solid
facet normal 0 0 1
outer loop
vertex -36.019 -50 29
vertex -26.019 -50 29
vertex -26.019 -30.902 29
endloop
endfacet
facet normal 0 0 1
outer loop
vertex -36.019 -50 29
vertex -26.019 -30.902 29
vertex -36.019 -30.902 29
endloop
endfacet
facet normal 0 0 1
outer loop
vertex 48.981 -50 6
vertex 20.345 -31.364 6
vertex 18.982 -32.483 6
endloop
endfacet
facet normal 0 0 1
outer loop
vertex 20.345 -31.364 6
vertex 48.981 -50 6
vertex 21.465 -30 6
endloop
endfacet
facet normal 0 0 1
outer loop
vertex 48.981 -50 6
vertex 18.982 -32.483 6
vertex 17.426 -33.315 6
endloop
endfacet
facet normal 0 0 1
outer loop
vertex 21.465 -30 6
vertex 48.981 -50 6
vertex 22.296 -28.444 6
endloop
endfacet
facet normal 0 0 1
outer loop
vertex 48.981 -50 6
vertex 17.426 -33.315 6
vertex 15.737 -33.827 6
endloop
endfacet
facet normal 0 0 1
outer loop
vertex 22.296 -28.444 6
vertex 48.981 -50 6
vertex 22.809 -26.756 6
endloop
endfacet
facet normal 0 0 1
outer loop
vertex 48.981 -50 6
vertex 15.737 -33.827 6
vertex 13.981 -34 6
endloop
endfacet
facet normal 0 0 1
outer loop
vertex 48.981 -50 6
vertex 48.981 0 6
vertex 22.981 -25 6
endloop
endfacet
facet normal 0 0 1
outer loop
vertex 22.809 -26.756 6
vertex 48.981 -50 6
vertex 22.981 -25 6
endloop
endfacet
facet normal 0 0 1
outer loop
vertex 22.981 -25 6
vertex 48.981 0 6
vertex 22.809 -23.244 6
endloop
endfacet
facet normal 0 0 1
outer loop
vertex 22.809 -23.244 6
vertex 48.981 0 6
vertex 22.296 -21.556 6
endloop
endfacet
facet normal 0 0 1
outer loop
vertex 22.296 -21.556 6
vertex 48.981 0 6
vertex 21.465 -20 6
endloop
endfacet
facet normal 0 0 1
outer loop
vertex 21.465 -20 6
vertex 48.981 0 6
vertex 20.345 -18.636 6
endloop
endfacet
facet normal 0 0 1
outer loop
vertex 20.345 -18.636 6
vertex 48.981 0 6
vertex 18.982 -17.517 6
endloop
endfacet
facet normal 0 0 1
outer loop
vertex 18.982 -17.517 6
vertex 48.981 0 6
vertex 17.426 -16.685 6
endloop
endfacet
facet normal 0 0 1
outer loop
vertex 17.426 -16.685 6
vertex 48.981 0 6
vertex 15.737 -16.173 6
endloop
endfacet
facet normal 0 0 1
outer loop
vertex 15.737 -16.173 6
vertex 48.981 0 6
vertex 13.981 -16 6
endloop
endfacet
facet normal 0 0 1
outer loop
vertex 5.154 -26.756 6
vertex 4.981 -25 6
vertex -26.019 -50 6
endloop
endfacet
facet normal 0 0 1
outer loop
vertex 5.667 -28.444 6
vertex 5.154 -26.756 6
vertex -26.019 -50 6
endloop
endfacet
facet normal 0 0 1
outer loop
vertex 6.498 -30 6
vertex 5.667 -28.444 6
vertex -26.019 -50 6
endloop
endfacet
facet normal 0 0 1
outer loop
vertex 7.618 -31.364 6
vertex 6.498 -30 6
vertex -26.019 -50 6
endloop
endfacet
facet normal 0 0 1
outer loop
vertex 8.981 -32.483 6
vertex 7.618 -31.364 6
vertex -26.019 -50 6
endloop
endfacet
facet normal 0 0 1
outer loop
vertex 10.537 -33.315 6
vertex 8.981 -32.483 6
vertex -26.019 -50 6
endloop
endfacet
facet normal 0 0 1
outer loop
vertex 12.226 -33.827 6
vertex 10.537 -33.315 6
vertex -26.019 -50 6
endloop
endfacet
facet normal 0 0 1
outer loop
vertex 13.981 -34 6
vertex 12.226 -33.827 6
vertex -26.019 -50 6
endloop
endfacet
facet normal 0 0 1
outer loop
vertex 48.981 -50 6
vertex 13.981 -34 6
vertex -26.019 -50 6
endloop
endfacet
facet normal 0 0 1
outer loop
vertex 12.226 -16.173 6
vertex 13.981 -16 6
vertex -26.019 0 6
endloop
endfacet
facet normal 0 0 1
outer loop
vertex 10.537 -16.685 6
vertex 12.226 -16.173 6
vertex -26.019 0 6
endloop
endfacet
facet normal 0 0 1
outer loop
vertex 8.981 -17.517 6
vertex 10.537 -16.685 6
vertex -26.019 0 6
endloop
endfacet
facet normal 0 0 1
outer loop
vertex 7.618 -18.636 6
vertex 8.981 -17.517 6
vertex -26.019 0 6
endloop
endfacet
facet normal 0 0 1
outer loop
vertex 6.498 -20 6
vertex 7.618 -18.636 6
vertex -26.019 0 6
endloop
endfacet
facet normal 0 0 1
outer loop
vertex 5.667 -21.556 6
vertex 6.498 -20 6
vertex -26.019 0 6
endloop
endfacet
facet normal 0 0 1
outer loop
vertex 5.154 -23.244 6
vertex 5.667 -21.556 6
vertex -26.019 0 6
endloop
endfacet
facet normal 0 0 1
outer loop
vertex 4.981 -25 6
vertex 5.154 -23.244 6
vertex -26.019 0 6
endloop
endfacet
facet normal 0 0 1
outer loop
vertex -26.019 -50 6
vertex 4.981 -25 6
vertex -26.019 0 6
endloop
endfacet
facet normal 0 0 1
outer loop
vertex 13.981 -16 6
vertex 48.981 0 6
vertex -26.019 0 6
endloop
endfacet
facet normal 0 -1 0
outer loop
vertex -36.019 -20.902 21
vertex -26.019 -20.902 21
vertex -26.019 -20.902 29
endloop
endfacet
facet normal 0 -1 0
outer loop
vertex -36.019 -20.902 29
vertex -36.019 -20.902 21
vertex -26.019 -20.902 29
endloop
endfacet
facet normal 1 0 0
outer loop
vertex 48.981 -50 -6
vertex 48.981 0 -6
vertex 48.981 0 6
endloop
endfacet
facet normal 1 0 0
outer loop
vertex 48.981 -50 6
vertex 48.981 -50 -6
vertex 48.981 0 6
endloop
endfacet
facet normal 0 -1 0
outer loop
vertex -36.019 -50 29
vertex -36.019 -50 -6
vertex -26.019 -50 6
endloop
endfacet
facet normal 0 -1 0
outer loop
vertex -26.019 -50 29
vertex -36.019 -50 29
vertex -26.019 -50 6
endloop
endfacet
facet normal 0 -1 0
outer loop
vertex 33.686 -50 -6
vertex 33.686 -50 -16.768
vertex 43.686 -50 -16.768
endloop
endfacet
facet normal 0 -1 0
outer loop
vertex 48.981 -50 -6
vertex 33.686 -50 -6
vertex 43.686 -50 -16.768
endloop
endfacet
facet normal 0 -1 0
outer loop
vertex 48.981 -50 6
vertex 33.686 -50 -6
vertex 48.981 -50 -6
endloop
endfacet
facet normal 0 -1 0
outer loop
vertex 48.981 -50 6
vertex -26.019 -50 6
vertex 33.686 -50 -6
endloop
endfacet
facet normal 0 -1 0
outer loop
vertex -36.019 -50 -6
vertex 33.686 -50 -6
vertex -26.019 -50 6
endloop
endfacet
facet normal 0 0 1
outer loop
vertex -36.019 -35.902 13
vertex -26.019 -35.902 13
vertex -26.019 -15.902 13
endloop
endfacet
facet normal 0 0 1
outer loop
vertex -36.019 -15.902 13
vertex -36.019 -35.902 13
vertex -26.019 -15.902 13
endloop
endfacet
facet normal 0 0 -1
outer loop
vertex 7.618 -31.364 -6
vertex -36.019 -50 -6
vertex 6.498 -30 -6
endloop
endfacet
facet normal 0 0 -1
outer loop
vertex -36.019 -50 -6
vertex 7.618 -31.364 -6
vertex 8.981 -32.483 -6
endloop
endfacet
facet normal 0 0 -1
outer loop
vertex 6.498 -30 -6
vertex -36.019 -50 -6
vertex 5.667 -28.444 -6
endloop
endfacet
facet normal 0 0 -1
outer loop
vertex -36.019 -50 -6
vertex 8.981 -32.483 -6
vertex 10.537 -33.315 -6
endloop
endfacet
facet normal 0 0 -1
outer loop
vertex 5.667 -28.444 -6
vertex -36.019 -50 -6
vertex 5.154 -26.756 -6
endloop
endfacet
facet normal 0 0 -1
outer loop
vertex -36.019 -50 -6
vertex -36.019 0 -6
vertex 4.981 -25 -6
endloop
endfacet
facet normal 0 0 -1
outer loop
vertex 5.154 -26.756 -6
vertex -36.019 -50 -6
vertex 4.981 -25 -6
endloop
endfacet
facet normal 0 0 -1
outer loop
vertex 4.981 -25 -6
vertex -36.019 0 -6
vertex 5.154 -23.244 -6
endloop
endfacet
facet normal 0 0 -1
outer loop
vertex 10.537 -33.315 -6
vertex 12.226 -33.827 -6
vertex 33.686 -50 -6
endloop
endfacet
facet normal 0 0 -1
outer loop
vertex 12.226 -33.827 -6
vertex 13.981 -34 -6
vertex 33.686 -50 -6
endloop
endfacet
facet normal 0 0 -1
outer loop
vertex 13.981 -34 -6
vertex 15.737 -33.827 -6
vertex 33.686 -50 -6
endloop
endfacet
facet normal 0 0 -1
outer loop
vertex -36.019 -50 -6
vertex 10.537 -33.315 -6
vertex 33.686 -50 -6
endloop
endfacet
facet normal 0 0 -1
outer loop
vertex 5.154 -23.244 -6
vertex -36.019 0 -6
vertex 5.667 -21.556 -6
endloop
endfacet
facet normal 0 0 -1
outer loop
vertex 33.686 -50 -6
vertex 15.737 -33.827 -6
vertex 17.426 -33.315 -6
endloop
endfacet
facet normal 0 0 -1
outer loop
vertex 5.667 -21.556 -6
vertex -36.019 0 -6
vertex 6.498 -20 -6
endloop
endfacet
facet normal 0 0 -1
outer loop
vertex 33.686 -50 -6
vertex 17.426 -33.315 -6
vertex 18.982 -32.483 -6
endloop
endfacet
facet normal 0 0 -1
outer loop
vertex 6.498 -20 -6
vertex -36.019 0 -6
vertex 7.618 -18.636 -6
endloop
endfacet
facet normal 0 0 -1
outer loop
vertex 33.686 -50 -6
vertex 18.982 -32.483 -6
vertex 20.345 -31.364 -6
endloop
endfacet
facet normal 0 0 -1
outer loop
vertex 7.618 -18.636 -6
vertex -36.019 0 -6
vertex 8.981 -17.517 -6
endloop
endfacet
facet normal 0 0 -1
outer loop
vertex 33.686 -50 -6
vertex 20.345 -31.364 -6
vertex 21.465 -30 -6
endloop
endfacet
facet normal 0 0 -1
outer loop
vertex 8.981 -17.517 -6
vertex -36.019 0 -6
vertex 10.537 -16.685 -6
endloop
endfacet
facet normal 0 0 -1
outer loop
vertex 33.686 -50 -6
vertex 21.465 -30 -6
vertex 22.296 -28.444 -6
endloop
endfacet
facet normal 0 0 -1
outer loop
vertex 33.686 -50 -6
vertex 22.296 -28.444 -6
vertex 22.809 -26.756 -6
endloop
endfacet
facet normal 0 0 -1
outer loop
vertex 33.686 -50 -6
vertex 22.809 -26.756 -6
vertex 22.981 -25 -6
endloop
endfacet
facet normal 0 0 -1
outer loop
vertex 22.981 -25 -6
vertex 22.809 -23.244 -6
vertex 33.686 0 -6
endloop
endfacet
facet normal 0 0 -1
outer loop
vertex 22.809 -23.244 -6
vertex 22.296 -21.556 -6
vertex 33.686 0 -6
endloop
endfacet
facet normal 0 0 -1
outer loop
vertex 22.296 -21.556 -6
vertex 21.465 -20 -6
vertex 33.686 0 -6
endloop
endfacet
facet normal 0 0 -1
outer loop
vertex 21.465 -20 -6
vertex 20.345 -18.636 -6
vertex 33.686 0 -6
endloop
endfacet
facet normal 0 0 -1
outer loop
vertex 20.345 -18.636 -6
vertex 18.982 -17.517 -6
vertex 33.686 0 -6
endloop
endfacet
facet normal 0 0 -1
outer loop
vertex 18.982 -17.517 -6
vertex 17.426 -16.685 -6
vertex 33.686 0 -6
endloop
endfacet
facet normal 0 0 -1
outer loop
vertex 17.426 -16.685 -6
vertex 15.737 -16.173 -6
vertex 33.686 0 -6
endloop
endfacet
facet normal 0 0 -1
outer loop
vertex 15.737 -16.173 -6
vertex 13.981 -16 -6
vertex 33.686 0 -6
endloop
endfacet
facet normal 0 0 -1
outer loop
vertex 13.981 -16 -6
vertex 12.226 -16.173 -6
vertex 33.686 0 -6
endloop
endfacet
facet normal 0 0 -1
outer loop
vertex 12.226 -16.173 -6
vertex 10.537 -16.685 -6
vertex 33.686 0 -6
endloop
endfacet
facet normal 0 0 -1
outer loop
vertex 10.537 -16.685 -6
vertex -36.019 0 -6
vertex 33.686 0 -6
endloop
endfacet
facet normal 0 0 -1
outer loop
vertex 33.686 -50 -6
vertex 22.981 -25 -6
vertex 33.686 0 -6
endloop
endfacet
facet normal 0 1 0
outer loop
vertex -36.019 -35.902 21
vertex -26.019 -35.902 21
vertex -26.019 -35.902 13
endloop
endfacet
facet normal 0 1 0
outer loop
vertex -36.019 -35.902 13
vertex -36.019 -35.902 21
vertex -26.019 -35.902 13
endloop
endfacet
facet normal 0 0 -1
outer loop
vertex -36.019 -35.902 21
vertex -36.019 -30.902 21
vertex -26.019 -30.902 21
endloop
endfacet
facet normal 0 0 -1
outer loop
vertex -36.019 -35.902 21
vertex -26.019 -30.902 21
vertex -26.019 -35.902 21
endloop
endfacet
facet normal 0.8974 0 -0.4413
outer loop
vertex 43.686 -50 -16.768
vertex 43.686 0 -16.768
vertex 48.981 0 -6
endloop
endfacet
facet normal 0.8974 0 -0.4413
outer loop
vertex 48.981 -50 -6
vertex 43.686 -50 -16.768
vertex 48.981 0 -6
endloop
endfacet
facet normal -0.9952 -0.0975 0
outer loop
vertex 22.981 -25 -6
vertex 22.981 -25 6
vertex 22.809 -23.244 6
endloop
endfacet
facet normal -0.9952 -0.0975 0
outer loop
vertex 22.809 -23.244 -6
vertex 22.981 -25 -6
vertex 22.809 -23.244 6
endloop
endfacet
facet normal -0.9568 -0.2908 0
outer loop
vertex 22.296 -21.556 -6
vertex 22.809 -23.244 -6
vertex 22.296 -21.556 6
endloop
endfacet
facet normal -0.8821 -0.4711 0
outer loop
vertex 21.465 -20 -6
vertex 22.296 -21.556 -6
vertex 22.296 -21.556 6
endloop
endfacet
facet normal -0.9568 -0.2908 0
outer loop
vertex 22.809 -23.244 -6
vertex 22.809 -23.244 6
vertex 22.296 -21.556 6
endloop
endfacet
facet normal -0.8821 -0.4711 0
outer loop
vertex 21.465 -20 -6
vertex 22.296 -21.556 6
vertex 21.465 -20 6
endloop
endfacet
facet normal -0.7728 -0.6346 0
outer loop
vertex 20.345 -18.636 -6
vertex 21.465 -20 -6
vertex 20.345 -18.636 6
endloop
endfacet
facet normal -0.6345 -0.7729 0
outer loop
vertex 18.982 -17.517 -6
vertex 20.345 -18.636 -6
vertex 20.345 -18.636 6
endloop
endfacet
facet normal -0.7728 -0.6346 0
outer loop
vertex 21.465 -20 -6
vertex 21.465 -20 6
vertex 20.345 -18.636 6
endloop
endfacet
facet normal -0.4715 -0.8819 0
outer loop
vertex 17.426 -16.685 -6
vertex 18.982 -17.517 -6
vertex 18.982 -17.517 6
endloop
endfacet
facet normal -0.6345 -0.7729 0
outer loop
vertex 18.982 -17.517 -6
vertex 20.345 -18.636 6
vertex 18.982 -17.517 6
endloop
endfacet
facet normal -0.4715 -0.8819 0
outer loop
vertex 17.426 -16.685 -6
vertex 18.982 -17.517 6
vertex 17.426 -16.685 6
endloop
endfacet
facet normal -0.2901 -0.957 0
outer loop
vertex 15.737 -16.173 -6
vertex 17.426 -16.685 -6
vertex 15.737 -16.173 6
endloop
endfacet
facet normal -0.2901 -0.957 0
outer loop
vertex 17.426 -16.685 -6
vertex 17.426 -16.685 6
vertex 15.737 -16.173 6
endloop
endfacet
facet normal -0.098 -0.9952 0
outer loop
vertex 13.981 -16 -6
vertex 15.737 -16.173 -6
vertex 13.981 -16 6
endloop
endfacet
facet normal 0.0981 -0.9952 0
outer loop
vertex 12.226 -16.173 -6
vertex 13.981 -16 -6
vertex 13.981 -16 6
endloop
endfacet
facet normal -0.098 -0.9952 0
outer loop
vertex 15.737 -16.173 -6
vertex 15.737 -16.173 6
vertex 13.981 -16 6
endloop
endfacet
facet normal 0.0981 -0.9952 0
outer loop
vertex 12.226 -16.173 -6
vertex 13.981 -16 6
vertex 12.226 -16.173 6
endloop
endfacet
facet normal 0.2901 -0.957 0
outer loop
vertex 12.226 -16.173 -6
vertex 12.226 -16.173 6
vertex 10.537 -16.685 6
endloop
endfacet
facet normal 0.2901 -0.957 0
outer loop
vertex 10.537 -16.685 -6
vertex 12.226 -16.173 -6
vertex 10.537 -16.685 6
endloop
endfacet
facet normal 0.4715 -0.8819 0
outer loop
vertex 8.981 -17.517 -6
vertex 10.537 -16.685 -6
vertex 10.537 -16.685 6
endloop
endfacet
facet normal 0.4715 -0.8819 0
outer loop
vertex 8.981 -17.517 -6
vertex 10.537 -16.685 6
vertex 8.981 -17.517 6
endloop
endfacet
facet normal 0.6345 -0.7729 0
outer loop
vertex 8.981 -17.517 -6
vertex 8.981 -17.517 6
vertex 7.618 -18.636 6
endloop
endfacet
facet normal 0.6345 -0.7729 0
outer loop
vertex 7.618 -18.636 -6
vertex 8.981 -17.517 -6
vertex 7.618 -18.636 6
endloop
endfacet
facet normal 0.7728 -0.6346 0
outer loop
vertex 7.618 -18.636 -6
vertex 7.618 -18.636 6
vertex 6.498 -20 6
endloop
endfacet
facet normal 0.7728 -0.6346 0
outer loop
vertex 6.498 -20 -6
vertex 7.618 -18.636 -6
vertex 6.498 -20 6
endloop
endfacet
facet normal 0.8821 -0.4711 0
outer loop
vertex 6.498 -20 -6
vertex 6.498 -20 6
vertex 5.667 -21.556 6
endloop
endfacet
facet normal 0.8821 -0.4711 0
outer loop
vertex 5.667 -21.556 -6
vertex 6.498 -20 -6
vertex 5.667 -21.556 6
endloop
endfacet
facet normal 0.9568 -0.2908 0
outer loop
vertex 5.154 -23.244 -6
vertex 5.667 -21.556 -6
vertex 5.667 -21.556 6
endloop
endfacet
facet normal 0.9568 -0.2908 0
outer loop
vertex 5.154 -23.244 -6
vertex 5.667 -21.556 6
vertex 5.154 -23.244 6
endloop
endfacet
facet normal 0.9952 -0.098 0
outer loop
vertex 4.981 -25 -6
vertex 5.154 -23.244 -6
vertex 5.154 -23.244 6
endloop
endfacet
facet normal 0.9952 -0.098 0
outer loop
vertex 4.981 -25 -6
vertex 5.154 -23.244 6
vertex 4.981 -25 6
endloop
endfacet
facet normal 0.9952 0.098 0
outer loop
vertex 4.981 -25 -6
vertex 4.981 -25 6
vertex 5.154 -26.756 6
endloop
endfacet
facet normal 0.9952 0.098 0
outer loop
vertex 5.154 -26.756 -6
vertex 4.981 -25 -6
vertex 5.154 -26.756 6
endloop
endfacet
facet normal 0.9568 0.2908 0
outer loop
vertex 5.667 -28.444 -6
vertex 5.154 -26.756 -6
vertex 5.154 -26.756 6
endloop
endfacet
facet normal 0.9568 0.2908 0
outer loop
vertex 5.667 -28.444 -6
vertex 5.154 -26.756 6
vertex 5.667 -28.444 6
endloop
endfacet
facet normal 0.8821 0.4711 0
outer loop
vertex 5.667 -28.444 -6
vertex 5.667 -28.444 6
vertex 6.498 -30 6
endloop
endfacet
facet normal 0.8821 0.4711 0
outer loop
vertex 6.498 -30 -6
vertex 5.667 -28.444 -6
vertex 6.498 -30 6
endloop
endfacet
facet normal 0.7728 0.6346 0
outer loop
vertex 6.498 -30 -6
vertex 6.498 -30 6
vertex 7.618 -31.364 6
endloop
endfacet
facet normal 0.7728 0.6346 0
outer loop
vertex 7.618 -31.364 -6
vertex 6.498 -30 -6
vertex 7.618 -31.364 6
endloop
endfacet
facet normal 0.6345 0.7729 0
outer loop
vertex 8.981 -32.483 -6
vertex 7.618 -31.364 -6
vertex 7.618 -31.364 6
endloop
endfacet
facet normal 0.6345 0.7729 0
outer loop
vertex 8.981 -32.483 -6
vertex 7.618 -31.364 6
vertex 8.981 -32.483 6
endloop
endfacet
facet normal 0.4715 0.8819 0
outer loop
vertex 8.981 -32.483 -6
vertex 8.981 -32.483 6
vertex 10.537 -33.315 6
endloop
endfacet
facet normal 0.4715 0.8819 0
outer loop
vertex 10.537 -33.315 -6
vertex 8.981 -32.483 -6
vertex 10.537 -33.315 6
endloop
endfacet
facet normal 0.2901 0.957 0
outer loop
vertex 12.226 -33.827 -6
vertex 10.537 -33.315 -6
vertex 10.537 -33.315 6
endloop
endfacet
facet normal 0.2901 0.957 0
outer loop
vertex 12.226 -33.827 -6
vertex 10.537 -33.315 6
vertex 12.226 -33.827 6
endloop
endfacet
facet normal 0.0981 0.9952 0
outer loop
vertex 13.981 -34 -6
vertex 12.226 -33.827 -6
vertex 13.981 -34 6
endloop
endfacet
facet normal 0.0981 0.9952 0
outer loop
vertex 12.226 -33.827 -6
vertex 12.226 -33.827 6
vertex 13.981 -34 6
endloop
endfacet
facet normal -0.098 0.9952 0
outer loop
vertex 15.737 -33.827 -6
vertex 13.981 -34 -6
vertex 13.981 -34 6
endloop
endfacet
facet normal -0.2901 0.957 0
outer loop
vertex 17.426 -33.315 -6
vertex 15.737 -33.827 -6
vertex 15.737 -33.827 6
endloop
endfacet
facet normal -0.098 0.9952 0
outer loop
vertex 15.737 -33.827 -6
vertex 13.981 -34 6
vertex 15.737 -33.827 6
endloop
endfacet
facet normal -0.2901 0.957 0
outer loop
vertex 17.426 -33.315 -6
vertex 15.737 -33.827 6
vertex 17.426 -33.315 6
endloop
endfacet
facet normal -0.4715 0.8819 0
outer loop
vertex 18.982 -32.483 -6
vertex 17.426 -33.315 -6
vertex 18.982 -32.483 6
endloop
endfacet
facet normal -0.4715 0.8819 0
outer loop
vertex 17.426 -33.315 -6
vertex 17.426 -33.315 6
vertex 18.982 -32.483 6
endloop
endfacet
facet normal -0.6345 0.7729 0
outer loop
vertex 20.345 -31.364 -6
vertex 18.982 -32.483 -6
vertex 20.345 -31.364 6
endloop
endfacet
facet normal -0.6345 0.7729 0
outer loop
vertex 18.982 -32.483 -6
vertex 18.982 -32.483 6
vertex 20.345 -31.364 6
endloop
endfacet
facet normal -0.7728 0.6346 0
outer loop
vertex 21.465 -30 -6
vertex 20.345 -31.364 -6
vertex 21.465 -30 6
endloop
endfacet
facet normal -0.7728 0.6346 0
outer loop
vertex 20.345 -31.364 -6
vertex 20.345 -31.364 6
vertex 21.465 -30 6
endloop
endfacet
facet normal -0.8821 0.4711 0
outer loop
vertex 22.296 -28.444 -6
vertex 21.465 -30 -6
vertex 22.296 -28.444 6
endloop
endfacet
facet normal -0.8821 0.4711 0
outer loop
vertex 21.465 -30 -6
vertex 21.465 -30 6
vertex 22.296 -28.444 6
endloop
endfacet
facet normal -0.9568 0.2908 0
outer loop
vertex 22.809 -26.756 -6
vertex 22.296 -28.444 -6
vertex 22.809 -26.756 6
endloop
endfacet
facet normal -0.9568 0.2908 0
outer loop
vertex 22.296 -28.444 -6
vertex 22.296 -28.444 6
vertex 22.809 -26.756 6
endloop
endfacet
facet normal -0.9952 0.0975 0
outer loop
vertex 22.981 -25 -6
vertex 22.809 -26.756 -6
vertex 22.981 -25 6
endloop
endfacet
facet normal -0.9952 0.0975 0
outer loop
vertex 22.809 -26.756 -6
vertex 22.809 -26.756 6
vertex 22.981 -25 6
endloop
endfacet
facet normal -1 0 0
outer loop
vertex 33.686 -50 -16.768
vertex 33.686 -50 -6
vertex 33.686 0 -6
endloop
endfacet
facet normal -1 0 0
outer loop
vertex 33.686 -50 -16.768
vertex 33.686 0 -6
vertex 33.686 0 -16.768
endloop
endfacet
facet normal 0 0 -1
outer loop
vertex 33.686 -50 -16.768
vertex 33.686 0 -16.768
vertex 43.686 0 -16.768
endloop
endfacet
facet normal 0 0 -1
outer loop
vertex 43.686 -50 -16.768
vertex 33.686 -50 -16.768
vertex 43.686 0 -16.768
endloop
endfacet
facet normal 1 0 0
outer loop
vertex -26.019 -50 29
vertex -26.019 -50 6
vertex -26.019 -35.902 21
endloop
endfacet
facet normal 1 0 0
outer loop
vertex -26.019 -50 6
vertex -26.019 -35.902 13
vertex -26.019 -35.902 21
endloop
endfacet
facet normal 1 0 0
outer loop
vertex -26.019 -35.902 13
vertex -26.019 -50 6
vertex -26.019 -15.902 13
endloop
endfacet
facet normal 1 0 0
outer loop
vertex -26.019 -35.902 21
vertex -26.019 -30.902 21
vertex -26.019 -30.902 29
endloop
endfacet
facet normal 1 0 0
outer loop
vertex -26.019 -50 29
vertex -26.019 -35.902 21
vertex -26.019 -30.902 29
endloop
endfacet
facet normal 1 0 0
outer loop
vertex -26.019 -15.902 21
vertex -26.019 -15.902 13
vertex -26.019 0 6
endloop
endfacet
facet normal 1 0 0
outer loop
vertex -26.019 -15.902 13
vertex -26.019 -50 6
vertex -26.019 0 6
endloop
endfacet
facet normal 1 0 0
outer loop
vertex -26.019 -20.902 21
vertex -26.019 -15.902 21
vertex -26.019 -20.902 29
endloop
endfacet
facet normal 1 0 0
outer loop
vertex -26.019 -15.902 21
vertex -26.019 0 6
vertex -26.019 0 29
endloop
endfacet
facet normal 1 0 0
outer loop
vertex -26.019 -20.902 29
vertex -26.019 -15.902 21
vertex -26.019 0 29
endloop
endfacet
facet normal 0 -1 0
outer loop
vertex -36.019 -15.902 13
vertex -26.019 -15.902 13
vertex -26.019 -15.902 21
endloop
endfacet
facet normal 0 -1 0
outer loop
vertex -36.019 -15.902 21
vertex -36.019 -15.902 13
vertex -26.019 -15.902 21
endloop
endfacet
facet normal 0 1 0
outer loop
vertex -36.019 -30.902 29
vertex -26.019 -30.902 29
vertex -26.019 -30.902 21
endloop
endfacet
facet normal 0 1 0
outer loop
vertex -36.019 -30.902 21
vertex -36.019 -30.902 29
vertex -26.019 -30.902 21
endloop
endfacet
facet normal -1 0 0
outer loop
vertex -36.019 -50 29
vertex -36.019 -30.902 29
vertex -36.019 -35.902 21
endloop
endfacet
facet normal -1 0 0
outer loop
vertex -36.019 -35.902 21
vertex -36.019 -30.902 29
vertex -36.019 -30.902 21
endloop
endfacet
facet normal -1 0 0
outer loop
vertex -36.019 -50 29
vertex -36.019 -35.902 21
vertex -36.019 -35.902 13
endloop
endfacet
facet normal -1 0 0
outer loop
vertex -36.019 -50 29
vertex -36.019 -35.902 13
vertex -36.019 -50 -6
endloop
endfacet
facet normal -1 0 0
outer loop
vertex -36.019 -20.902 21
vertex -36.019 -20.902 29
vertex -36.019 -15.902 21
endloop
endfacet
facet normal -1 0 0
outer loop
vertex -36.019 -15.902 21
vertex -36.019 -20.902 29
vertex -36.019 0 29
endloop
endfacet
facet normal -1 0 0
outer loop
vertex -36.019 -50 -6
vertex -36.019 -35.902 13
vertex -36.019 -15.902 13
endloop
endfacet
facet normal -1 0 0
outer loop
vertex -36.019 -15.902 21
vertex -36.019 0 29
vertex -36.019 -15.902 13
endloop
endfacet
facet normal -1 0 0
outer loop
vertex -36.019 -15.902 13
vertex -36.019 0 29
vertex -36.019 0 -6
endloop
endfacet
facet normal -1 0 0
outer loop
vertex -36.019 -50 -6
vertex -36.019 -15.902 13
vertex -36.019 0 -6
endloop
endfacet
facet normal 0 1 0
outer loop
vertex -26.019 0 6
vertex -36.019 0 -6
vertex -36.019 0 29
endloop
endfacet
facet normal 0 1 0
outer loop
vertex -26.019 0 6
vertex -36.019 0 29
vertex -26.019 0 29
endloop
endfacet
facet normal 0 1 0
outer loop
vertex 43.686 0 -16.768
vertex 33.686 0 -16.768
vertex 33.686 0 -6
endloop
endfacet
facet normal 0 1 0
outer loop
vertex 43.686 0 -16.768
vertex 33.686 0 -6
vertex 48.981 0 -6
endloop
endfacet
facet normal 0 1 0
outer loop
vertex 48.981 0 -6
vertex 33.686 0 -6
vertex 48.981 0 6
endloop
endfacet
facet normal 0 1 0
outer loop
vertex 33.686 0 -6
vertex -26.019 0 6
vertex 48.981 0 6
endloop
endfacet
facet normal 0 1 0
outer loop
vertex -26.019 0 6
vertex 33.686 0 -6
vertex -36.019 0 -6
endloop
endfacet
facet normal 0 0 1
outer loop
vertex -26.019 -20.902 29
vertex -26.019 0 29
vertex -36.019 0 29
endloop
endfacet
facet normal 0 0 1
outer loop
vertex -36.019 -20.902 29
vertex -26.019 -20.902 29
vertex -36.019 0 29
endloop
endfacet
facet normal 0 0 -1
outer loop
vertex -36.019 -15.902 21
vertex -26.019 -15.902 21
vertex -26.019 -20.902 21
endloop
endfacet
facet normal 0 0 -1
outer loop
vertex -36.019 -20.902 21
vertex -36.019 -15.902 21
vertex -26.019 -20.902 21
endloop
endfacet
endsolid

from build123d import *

# Parameters (mm, degrees)
F1_DEPTH = 50
F3_DEPTH = 25
F4_R     = 9
F5_DEPTH = 25


with BuildPart() as f1:
    # F0 (on Front) → F1 (new body)
    with BuildSketch(Plane.XZ):
        Polygon((48.981464, 6), (-26.018536, 6), (-26.018536, 29), (-36.018536, 29), (-36.018536, -6), (33.685692, -6), (33.685692, -16.768231), (43.685692, -16.768231), (48.981464, -6), align=None)
    extrude(amount=F1_DEPTH)

    # F2 (on face) → F3 (cut)
    with BuildSketch(Plane.YZ.offset(-26.018536)):
        Polygon((-20.902064, 29), (-30.902064, 29), (-30.902064, 21), (-35.902064, 21), (-35.902064, 13), (-15.902064, 13), (-15.902064, 21), (-20.902064, 21), align=None)
    extrude(amount=-F3_DEPTH, mode=Mode.SUBTRACT)

    # F4 (on face) → F5 (cut)
    with BuildSketch(Plane.XY.offset(6)):
        with Locations((13.981464, -25)):
            Circle(F4_R)
    extrude(amount=-F5_DEPTH, mode=Mode.SUBTRACT)


solid = f1.part
